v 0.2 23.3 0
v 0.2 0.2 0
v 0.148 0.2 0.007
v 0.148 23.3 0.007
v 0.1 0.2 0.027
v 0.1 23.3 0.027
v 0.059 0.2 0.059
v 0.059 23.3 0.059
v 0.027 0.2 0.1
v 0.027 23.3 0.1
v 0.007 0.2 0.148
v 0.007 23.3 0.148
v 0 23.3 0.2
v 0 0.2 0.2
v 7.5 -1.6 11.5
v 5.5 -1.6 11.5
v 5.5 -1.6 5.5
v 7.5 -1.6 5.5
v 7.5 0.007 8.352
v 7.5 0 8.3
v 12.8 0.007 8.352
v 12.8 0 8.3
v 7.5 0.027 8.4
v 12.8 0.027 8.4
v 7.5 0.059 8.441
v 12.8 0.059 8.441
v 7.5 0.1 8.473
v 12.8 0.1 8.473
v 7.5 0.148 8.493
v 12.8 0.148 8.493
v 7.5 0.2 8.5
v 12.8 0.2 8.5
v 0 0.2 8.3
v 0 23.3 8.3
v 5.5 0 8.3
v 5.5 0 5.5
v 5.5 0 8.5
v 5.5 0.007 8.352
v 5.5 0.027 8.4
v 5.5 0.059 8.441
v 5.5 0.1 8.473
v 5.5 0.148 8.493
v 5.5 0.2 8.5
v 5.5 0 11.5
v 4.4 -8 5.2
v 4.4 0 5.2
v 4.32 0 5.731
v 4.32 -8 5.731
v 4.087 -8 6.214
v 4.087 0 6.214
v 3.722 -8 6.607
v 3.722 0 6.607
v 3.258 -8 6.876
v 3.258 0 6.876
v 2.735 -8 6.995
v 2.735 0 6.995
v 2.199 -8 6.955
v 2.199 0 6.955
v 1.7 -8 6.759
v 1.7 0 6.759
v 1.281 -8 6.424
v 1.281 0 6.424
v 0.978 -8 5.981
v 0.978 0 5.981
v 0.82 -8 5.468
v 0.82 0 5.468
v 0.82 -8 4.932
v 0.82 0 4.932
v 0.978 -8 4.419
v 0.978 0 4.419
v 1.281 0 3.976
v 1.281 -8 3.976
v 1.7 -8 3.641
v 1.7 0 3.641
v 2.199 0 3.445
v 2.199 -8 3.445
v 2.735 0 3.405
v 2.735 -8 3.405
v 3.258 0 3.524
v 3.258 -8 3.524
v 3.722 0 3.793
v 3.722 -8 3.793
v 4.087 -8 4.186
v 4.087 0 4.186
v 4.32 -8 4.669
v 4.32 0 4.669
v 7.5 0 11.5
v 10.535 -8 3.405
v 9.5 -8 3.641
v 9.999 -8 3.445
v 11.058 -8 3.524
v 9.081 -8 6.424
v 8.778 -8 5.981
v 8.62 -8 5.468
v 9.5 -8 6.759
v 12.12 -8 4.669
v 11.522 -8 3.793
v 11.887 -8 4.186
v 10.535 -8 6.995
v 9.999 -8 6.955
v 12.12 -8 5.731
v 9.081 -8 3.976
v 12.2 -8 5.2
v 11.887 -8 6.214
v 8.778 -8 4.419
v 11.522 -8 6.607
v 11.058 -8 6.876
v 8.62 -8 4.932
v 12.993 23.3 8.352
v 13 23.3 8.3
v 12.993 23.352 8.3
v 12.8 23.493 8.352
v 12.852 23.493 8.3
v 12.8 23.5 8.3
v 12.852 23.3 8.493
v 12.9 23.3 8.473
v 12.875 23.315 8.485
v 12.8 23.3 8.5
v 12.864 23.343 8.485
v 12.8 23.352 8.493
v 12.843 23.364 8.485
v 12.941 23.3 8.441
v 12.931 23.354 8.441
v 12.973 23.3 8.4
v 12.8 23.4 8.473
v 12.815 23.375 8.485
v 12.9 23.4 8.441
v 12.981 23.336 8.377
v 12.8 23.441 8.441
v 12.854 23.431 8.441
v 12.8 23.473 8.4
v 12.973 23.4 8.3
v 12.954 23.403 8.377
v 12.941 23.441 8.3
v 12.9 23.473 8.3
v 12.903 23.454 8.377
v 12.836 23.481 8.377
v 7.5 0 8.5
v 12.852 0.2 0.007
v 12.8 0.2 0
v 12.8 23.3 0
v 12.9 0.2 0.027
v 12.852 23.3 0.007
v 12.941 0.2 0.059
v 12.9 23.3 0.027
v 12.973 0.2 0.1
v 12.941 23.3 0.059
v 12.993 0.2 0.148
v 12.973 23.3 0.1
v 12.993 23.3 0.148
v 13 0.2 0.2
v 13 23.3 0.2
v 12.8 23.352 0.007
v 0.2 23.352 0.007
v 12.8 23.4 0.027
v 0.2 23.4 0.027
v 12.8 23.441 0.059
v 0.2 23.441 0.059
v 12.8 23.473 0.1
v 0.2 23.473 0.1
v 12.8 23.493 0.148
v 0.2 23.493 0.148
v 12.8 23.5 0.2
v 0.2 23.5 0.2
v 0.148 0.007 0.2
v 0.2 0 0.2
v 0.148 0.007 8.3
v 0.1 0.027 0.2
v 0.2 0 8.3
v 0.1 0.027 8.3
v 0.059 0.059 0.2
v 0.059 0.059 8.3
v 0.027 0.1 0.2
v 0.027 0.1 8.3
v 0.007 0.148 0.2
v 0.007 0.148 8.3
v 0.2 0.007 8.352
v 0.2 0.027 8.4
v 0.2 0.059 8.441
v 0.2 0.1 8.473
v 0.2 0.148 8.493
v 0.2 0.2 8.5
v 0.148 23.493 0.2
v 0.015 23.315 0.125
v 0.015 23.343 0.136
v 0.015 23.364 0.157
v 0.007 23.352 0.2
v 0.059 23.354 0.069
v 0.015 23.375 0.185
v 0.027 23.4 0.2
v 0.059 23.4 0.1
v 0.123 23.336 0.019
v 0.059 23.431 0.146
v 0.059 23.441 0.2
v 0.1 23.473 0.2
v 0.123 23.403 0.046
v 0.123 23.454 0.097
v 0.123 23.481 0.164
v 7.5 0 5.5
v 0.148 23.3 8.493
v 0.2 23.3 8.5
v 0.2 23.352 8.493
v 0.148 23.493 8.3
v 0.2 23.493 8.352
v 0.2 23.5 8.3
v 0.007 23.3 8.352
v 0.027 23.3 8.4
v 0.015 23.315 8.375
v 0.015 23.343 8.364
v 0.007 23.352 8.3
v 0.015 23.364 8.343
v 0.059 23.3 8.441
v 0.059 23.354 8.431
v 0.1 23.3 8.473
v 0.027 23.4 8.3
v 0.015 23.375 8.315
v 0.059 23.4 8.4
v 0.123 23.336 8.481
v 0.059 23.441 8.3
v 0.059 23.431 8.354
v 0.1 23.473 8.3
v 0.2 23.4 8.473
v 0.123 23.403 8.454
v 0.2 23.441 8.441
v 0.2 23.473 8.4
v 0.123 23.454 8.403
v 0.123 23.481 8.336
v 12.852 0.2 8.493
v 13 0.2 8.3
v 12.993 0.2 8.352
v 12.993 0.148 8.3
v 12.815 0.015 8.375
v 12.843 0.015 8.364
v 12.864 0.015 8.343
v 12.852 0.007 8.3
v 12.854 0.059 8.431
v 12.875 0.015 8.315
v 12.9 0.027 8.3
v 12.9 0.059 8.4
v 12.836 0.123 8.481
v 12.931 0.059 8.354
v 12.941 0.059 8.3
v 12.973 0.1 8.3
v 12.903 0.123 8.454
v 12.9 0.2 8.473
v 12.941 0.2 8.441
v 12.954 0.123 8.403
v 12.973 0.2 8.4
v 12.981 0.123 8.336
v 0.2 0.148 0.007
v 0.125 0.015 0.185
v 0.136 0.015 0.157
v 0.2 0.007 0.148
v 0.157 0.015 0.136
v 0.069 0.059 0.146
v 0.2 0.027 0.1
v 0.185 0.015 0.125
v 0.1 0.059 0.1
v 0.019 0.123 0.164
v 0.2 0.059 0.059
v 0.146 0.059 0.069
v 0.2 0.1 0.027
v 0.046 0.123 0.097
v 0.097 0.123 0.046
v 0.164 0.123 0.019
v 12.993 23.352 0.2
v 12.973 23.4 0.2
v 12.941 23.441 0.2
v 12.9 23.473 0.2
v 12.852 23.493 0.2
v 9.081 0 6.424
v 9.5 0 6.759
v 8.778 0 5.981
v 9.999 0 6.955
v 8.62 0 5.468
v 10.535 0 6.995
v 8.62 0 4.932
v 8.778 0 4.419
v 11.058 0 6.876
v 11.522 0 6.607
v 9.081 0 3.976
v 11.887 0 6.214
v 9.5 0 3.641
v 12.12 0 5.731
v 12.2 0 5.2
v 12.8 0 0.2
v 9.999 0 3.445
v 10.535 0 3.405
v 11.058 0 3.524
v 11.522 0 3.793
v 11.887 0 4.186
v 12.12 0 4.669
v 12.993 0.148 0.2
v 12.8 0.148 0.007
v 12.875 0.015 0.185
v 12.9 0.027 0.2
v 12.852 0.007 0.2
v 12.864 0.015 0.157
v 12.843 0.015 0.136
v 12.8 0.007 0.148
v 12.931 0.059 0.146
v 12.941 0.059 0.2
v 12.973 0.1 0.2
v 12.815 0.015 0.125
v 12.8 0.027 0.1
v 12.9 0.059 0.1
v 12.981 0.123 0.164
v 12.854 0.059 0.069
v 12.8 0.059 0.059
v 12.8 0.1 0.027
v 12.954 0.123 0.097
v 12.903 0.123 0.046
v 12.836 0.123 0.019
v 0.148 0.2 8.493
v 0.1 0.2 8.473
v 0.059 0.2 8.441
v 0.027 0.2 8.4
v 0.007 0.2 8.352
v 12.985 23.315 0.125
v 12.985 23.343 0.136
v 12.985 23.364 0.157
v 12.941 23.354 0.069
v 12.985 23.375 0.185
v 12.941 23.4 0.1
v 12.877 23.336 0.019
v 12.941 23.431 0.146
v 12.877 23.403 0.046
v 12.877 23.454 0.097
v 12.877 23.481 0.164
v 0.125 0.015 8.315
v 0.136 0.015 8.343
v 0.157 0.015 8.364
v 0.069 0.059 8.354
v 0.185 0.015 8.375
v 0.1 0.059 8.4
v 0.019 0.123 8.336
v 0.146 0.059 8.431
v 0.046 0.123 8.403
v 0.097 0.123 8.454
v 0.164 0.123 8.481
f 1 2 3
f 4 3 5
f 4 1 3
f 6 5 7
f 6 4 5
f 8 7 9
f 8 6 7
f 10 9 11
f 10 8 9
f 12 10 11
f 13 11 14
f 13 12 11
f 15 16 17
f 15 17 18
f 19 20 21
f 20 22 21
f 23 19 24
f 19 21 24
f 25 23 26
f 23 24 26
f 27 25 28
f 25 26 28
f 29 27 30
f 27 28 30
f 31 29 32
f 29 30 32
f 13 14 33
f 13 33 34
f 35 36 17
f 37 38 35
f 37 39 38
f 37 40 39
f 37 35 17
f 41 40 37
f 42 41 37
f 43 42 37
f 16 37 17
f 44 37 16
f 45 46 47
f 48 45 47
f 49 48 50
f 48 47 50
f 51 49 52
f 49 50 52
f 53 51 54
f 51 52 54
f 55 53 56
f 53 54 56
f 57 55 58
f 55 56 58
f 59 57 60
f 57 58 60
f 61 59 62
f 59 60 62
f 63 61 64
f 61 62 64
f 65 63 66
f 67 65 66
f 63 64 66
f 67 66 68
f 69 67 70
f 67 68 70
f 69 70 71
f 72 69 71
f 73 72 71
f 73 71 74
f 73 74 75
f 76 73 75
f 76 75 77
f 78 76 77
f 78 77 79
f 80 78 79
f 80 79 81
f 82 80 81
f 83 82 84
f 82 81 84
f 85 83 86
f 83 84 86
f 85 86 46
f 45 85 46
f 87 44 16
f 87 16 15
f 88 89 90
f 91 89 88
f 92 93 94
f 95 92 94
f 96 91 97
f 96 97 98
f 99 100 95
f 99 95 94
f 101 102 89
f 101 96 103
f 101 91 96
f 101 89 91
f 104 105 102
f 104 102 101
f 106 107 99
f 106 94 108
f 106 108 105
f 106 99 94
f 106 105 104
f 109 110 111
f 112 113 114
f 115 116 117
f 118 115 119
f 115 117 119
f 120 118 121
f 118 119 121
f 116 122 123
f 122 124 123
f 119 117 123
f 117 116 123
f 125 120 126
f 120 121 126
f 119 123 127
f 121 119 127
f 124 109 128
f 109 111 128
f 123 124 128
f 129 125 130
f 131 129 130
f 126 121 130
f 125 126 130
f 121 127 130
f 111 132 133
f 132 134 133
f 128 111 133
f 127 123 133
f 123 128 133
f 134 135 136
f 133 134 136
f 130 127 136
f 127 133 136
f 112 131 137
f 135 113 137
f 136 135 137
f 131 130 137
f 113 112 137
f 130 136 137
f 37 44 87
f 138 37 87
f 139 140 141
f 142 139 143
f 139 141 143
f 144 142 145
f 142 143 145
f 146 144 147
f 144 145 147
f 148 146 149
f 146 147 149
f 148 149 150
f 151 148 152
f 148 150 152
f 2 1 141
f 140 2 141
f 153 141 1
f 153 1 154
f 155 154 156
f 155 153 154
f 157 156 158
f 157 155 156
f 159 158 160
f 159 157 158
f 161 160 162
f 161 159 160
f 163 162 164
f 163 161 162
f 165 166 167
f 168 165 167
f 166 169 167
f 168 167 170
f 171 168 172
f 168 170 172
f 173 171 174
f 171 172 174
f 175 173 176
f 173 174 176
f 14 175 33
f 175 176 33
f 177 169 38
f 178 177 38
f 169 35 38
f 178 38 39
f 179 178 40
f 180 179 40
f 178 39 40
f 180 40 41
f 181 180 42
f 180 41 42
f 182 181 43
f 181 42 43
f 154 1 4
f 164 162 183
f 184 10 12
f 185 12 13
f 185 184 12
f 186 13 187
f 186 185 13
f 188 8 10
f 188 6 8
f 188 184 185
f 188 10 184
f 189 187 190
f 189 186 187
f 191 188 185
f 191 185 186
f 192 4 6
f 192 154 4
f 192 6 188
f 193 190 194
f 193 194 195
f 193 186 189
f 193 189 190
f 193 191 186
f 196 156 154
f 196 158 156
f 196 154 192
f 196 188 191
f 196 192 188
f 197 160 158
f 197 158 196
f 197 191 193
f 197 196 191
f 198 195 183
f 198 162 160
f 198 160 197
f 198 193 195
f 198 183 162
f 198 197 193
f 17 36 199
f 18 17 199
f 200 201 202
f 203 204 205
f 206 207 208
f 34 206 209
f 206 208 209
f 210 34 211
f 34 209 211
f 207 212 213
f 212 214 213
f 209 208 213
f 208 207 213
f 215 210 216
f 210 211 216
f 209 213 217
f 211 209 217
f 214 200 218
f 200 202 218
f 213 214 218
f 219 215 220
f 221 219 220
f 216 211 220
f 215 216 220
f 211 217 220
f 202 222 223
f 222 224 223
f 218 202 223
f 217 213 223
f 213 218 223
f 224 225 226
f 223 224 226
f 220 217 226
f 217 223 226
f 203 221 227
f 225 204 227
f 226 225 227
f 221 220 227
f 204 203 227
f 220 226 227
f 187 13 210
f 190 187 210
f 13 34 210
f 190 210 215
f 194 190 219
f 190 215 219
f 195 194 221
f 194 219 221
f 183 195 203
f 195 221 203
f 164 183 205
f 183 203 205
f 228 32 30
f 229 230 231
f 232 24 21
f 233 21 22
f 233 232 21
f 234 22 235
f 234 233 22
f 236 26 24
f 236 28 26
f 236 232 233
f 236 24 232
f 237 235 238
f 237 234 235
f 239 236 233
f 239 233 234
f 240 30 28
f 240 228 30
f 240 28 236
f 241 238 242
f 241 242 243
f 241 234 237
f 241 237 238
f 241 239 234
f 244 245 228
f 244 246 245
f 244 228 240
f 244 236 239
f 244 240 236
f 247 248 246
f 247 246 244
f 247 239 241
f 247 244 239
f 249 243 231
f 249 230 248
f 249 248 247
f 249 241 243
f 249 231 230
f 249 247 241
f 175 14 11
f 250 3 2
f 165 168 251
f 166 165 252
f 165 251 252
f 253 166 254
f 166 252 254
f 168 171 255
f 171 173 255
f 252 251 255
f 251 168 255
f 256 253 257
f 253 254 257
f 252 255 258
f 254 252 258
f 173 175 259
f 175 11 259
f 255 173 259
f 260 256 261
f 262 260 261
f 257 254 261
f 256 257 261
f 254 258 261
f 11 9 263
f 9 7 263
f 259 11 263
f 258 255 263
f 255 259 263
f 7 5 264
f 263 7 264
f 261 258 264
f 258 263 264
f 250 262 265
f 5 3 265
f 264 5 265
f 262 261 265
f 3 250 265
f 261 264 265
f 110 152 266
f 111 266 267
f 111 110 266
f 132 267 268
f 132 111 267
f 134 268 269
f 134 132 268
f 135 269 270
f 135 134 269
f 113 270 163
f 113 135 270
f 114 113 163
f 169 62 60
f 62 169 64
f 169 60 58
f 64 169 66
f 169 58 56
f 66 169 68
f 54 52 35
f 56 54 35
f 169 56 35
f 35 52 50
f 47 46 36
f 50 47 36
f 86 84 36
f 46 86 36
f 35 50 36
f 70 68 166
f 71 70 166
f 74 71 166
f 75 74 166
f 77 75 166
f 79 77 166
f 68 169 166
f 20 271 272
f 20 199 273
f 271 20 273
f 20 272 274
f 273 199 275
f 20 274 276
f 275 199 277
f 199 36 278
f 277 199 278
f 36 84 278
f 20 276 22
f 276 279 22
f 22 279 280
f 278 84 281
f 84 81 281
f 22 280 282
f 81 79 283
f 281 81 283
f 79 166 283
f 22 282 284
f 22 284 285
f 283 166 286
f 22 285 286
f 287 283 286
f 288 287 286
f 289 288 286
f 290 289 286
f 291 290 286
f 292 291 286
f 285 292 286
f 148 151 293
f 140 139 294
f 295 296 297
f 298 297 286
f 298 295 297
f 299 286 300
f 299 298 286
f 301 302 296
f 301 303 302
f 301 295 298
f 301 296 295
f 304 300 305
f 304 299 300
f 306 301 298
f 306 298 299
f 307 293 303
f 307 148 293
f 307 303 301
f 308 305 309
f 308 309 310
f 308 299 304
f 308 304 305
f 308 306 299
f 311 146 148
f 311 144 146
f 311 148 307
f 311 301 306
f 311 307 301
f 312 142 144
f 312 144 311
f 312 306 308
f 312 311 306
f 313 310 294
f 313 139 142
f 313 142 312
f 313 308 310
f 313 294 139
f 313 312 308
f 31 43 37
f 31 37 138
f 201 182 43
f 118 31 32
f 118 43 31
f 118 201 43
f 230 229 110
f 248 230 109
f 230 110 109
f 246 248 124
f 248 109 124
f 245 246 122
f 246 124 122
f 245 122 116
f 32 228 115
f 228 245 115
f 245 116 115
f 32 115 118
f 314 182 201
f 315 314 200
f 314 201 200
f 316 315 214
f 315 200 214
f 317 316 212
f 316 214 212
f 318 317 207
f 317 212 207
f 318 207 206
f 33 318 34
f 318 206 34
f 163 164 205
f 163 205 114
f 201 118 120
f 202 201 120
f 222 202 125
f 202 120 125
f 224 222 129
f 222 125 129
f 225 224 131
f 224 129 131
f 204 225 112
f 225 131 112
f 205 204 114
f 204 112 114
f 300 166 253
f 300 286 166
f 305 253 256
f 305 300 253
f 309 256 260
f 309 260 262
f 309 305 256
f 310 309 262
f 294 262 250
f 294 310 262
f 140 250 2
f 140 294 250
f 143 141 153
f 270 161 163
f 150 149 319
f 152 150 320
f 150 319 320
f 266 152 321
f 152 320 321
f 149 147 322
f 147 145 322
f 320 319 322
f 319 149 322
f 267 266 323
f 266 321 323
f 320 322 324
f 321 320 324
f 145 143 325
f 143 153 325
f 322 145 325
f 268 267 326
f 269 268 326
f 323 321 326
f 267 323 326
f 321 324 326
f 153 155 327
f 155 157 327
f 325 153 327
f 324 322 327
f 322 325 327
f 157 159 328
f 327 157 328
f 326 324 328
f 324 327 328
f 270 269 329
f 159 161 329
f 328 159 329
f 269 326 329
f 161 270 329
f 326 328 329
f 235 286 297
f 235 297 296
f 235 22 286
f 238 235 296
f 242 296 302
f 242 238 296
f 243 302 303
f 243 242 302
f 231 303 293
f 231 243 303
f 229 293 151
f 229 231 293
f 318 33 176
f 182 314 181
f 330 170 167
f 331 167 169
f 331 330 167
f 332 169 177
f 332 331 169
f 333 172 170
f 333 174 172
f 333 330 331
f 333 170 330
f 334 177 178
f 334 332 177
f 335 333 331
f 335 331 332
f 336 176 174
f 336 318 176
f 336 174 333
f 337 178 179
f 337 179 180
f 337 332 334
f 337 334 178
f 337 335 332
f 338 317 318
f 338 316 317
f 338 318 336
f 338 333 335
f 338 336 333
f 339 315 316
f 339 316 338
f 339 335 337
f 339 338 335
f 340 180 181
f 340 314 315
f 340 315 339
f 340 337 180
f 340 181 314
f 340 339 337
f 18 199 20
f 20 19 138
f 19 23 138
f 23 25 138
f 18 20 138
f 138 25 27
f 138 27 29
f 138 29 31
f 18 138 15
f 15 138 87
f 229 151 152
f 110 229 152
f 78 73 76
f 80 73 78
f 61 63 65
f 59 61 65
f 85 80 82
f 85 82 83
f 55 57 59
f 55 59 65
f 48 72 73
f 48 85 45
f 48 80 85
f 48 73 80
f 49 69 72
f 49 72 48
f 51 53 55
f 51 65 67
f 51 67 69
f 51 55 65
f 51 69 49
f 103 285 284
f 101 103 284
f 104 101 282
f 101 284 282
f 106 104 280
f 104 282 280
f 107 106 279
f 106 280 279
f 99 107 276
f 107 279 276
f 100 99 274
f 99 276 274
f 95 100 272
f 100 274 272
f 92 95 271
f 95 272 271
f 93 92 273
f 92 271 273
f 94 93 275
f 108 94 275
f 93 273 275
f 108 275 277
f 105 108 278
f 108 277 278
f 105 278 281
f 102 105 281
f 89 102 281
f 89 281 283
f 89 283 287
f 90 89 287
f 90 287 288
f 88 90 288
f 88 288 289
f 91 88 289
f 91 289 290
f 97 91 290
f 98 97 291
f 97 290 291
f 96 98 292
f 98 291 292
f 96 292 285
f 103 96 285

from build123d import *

# Parameters (mm, degrees)
F0_W     = 13
F0_H     = 23.5
F1_DEPTH = 8.5
F2_R     = 1.8
F3_DEPTH = 8
F4_W     = 2
F4_H     = 6
F5_DEPTH = 1.6
F6_R     = 0.2


with BuildPart() as f1:
    # F0 (on Top) → F1 (new body)
    with BuildSketch(Plane.XY):
        with Locations((6.5, 11.75)):
            Rectangle(F0_W, F0_H)
    extrude(amount=F1_DEPTH)

    # F2 (on face) → F3 (join)
    with BuildSketch(Plane.XZ):
        with Locations((2.6, 5.2)):
            Circle(F2_R)
        with Locations((10.4, 5.2)):
            Circle(F2_R)
    extrude(amount=F3_DEPTH)

    # F4 (on face) → F5 (join)
    with BuildSketch(Plane.XZ):
        with Locations((6.5, 8.5)):
            Rectangle(F4_W, F4_H)
    extrude(amount=F5_DEPTH)

    # F6
    f6_edges = [f1.edges().sort_by_distance(p)[0] for p in [
        (6.5, 23.5, 0),
        (13, 11.75, 0),
        (0, 11.75, 0),
        (13, 23.5, 4.25),
        (13, 11.75, 8.5),
        (6.5, 23.5, 8.5),
        (0, 11.75, 8.5),
        (0, 23.5, 4.25),
        (0, 0, 4.25),
        (2.75, 0, 8.5),
        (10.25, 0, 8.5),
        (13, 0, 4.25),
        (6.5, 0, 0),
    ]]
    fillet(f6_edges, radius=F6_R)


solid = f1.part
